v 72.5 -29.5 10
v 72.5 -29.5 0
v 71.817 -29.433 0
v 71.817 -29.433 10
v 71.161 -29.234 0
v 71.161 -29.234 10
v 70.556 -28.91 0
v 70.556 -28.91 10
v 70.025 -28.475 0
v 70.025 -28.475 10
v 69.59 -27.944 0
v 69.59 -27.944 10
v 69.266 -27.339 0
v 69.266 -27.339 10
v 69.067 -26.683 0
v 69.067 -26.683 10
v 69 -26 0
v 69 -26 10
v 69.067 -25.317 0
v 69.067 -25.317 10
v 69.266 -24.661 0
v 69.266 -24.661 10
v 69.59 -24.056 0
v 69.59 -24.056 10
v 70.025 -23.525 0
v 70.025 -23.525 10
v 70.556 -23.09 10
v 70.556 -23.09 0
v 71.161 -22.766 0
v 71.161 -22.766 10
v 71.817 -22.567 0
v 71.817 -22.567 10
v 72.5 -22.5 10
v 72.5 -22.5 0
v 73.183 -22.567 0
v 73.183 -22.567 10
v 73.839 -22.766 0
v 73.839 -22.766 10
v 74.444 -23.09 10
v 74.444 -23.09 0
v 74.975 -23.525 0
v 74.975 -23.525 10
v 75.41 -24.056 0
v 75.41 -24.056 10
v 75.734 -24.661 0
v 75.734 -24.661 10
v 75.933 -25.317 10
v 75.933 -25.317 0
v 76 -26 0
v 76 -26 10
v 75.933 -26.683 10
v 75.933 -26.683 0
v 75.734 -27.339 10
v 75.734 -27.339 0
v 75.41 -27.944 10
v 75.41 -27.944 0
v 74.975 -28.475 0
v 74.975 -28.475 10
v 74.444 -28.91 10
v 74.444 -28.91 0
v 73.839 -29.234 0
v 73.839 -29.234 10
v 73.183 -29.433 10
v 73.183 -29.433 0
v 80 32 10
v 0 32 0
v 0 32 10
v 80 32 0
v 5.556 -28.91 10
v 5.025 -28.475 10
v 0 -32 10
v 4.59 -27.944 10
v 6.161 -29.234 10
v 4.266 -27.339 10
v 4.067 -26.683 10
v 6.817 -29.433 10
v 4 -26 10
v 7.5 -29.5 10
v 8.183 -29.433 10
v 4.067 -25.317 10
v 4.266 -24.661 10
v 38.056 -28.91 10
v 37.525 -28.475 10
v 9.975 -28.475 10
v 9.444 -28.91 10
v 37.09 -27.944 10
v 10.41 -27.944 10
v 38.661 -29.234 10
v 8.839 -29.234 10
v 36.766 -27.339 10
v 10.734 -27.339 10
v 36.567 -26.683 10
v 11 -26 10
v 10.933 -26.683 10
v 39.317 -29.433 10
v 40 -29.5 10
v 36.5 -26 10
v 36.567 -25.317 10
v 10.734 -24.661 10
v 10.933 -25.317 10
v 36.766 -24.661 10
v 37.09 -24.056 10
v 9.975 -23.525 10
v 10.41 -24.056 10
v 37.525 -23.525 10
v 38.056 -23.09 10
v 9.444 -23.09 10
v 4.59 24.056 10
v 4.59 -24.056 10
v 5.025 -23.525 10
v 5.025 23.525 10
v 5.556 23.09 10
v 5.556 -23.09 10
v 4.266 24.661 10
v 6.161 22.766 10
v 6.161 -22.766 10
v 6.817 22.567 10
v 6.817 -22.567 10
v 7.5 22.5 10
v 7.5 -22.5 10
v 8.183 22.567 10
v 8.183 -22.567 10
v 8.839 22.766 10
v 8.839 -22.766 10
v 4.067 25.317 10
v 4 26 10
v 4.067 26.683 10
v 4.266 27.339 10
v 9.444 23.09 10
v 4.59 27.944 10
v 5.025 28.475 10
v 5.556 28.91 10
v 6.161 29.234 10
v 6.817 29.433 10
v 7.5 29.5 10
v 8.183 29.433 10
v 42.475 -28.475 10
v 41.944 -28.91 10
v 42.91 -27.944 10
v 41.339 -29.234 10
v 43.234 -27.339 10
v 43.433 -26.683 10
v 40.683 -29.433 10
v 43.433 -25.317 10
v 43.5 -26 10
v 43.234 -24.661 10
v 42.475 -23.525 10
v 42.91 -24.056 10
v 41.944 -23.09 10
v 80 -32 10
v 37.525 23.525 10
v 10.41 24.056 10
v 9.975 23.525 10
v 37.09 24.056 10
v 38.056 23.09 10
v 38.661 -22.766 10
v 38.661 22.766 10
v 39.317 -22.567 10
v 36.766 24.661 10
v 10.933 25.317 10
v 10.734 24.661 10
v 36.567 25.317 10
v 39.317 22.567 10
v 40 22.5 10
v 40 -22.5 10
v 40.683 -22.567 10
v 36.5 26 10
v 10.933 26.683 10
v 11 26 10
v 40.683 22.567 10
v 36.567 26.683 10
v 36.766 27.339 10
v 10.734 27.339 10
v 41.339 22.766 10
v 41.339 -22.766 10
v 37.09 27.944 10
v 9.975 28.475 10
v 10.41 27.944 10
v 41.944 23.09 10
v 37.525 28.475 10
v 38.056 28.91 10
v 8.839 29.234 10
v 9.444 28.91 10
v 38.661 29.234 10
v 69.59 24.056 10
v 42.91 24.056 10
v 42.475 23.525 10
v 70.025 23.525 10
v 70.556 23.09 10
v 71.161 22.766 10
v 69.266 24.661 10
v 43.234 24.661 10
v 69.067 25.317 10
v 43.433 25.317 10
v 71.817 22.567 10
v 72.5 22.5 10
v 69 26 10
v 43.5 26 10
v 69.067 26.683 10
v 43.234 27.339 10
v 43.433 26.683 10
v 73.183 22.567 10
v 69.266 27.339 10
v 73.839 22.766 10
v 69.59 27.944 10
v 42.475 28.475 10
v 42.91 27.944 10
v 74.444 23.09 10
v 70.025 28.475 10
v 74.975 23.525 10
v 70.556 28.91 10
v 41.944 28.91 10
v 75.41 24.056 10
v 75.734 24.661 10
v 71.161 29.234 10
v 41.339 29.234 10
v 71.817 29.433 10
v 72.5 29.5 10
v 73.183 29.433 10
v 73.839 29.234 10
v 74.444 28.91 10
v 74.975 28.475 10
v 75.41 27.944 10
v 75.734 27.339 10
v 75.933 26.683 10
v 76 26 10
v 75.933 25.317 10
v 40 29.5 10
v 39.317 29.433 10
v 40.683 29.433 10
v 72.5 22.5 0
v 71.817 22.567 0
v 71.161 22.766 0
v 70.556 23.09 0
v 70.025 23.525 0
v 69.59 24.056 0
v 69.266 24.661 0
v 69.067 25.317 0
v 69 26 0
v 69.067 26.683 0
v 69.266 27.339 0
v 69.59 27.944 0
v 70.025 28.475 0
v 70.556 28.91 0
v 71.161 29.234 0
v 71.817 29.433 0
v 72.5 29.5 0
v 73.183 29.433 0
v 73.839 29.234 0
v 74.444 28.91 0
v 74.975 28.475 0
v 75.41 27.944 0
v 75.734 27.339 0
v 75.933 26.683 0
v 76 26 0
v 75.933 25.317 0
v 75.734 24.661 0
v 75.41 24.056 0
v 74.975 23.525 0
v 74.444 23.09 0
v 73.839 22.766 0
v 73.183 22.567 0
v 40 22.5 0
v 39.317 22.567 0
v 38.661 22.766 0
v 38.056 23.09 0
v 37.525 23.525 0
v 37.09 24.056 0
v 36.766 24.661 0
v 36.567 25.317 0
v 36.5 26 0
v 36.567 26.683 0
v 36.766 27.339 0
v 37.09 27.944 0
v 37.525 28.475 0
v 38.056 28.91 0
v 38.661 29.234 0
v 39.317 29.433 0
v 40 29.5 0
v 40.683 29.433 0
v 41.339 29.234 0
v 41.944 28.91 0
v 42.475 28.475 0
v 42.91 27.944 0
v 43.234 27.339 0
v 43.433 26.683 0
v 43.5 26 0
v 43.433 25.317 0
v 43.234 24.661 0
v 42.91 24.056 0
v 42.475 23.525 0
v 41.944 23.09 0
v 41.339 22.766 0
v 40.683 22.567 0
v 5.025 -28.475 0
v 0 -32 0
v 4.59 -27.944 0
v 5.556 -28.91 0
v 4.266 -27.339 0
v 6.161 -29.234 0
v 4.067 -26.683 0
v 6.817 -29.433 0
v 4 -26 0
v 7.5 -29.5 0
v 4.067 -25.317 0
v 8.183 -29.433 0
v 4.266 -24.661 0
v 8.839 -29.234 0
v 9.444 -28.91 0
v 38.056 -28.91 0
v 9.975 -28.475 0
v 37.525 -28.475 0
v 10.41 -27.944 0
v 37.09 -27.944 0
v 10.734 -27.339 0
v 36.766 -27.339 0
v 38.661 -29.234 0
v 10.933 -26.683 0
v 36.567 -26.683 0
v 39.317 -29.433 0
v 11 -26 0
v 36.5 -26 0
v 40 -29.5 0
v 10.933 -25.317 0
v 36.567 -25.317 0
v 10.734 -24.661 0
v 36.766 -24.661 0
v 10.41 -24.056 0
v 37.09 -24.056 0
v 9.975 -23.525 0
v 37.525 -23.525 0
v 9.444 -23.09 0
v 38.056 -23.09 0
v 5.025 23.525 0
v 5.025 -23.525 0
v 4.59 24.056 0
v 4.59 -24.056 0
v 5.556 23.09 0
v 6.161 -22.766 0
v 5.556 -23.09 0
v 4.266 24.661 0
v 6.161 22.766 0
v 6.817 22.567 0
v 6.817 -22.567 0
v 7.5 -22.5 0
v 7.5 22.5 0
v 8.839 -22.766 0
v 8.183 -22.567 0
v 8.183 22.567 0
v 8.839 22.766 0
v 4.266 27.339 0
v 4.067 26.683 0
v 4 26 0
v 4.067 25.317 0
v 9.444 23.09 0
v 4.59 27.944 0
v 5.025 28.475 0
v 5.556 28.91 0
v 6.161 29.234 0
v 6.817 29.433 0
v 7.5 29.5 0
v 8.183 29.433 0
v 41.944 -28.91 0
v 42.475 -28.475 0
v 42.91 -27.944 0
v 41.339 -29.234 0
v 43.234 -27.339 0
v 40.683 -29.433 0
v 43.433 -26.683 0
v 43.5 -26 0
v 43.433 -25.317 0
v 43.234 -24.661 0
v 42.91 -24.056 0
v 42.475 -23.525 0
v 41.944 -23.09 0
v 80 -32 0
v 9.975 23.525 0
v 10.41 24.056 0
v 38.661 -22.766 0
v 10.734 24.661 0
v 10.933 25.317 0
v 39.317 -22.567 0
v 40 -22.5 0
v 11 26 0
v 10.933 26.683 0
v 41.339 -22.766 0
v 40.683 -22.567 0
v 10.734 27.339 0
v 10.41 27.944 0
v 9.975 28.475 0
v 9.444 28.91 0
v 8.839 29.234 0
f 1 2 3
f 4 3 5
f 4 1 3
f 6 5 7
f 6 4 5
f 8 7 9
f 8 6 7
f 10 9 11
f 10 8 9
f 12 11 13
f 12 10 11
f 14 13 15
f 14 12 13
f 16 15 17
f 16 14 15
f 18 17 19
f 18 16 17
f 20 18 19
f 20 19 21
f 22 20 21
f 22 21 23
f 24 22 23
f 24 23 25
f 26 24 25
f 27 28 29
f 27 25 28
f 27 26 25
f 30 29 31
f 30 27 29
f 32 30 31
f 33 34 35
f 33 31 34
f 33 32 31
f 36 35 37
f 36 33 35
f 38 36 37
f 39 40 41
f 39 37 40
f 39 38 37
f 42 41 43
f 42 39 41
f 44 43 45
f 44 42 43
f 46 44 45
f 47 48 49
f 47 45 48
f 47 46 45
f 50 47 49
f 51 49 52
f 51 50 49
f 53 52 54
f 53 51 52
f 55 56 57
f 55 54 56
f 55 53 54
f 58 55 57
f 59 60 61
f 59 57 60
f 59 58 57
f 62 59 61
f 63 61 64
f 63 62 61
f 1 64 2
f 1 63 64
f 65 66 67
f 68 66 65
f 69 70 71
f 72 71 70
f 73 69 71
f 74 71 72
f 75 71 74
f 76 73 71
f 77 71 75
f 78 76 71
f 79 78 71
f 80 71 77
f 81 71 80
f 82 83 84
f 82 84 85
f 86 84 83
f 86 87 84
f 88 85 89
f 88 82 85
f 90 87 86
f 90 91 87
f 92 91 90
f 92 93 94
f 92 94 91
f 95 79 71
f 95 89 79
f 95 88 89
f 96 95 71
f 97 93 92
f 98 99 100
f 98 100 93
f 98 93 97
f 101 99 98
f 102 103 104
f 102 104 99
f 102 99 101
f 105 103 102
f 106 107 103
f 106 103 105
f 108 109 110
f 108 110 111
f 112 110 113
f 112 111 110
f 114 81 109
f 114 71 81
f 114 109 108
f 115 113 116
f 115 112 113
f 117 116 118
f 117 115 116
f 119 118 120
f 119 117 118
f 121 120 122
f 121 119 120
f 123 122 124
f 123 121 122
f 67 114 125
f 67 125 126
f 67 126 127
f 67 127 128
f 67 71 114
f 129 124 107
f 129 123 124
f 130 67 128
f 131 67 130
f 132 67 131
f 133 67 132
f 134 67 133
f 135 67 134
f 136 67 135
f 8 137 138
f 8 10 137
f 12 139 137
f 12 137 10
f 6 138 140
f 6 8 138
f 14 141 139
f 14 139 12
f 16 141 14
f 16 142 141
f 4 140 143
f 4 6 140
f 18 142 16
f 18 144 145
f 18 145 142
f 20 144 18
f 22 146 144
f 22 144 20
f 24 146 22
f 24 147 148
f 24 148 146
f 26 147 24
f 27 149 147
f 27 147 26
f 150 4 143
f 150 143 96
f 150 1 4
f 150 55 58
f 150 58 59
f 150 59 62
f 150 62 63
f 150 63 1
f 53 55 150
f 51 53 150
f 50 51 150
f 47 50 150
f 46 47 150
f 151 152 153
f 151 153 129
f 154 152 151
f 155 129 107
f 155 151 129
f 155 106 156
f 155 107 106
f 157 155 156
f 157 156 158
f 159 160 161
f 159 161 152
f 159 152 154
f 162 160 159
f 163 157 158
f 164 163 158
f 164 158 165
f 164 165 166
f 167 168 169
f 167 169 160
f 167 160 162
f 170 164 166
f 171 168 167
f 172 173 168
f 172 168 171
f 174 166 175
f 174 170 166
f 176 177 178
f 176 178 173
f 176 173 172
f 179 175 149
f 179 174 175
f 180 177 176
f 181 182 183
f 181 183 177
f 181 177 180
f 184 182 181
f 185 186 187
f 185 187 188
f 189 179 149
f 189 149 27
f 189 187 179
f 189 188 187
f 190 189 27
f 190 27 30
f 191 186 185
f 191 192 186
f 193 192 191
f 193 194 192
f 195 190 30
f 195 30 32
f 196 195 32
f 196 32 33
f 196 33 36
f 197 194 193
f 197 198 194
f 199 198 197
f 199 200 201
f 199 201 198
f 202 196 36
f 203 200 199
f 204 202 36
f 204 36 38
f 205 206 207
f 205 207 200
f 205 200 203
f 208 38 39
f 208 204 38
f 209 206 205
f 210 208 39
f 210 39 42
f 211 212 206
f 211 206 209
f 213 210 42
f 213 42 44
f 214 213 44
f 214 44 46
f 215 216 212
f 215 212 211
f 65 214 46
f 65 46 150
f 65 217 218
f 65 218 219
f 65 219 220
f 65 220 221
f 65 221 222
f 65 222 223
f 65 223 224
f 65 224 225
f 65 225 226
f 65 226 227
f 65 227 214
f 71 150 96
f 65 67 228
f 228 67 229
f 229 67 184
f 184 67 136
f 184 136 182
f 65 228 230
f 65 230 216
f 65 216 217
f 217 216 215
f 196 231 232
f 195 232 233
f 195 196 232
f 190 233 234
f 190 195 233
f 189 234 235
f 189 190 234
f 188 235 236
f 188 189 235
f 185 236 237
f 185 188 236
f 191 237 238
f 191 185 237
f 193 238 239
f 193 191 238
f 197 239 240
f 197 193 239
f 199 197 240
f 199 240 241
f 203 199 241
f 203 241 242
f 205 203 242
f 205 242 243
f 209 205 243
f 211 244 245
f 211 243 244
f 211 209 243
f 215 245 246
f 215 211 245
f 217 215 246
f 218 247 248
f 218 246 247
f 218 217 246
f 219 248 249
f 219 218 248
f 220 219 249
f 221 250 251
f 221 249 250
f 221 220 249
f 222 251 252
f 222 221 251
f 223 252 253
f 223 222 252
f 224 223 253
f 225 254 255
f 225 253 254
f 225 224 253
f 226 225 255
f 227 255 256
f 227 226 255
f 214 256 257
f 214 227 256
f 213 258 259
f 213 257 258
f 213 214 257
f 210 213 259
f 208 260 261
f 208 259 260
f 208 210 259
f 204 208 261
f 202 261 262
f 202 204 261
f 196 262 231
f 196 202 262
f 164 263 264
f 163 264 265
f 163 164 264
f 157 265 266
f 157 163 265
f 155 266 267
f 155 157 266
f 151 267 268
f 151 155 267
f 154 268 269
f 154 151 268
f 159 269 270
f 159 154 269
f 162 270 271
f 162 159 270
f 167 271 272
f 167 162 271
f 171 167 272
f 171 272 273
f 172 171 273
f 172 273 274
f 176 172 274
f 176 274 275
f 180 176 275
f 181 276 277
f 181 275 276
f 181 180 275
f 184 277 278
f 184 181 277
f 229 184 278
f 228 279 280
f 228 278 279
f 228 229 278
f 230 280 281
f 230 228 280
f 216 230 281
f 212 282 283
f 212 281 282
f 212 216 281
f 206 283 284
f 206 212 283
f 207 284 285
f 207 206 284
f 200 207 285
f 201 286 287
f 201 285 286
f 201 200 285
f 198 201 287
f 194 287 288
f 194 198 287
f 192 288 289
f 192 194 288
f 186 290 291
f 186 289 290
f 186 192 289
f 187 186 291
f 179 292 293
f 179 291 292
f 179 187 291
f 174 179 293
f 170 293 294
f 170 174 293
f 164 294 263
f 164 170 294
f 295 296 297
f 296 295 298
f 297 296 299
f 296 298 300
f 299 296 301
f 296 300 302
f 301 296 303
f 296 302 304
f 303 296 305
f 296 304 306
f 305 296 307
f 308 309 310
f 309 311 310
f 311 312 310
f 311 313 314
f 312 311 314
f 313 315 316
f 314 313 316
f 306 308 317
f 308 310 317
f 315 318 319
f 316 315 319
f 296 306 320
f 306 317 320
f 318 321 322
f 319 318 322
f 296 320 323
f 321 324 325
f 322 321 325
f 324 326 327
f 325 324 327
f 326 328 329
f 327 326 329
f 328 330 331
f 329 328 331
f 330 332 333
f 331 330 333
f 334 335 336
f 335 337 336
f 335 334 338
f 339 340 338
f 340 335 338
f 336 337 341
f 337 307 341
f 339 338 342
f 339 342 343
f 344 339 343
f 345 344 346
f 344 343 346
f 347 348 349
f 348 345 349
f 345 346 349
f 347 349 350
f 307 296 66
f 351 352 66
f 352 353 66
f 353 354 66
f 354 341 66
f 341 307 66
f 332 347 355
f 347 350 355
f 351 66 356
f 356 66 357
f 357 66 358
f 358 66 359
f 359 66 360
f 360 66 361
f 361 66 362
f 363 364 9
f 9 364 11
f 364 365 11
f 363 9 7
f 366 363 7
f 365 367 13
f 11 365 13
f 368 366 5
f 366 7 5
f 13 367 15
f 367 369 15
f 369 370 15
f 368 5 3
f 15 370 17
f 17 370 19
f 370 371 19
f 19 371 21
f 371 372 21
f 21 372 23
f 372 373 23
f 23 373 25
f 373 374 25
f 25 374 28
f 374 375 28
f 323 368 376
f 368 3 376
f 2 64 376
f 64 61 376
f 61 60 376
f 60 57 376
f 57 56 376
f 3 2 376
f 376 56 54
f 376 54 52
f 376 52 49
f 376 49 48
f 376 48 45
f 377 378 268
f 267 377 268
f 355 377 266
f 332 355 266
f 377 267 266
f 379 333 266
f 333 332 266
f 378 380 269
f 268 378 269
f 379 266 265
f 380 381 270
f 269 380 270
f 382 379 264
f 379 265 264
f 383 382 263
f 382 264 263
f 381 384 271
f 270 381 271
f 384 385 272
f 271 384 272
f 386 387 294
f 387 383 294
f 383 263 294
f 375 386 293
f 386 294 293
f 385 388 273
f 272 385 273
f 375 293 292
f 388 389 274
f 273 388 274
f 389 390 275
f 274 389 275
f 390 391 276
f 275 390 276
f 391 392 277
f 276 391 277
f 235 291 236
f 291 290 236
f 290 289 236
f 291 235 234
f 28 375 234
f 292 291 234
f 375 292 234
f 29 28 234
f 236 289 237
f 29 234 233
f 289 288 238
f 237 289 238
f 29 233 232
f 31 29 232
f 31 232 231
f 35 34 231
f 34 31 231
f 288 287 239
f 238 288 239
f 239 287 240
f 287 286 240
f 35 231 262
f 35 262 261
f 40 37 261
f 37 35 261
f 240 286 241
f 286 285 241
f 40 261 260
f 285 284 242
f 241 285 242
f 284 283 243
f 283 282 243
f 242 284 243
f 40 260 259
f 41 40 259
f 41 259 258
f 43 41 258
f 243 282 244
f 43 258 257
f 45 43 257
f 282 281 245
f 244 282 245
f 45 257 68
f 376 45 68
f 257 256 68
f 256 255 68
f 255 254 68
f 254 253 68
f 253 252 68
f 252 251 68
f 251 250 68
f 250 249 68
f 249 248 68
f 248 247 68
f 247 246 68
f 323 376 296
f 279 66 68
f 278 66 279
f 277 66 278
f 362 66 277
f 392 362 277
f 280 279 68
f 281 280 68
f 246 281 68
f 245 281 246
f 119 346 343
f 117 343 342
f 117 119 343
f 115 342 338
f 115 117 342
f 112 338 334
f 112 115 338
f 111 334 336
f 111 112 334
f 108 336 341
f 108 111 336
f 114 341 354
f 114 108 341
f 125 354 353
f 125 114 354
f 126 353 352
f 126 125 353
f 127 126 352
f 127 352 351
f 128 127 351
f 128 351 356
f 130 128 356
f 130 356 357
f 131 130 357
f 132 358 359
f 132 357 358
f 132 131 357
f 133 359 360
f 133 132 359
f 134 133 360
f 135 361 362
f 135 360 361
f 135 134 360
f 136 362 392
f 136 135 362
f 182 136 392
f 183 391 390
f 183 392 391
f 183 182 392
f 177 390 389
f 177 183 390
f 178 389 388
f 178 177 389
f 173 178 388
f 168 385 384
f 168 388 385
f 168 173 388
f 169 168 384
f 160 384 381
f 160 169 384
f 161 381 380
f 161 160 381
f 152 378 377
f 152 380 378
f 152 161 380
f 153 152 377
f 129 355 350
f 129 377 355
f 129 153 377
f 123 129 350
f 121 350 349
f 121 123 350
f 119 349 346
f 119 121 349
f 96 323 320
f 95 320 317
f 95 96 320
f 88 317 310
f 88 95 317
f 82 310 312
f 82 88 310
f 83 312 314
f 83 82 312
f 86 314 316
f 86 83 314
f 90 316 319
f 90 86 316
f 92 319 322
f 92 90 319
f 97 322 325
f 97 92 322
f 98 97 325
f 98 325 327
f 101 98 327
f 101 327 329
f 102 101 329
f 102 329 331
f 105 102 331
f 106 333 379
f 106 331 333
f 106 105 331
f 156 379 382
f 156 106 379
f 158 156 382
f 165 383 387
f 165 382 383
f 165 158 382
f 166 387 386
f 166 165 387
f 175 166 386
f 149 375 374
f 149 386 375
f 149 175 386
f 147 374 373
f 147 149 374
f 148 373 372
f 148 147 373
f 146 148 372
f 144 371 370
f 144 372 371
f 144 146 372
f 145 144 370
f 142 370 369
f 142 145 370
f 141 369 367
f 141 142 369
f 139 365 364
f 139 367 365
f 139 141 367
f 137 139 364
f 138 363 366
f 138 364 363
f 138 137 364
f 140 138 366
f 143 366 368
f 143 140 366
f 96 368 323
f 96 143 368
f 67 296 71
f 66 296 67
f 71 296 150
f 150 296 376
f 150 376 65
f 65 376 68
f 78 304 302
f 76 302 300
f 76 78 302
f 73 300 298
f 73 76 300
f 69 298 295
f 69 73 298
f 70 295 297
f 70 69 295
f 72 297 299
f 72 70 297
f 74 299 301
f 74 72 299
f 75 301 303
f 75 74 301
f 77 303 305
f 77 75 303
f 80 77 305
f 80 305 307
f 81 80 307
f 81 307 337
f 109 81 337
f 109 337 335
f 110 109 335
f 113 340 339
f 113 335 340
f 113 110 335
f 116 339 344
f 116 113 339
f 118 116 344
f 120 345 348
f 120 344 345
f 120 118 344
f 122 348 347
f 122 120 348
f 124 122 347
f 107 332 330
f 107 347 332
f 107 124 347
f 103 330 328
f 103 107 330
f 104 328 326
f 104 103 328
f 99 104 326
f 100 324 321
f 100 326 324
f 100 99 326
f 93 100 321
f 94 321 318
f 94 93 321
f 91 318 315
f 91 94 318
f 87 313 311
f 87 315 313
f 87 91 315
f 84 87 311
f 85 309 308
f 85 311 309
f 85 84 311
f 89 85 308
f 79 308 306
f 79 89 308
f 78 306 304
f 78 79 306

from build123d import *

# Parameters (mm, degrees)
SKETCH1_W            = 80
SKETCH1_H            = 64
BOSS_EXTRUDE1_DEPTH  = 10
LPATTERN1_COUNT      = 3
LPATTERN1_PITCH      = 32.5
LPATTERN1_COUNT_DIR2 = 2
LPATTERN1_PITCH_DIR2 = 52


with BuildPart() as part:
    # Sketch1 → Boss-Extrude1 (new body)
    with BuildSketch(Plane.XY):
        with Locations((40, 0)):
            Rectangle(SKETCH1_W, SKETCH1_H)
    extrude(amount=BOSS_EXTRUDE1_DEPTH)

    # Sketch4 → M6 Clearance Hole1 (revolve, cut)
    with BuildSketch(Plane(origin=(7.5, -26, 10), x_dir=(0, -1, 0), z_dir=(1, 0, 0))):
        Polygon((0, 0), (0, 28.103012167), (3.5, 26), (3.5, 0), align=None)
    m6_clearance_hole1 = revolve(axis=Axis((7.5, -26, 16.35), (0, 0, -1)), mode=Mode.SUBTRACT)

    # LPattern1: M6 Clearance Hole1 3 × 2
    with Locations(*[(i * LPATTERN1_PITCH, j * LPATTERN1_PITCH_DIR2, 0) for i in range(LPATTERN1_COUNT) for j in range(LPATTERN1_COUNT_DIR2) if (i, j) != (0, 0)]):
        add(m6_clearance_hole1, mode=Mode.SUBTRACT)


solid = part.part
